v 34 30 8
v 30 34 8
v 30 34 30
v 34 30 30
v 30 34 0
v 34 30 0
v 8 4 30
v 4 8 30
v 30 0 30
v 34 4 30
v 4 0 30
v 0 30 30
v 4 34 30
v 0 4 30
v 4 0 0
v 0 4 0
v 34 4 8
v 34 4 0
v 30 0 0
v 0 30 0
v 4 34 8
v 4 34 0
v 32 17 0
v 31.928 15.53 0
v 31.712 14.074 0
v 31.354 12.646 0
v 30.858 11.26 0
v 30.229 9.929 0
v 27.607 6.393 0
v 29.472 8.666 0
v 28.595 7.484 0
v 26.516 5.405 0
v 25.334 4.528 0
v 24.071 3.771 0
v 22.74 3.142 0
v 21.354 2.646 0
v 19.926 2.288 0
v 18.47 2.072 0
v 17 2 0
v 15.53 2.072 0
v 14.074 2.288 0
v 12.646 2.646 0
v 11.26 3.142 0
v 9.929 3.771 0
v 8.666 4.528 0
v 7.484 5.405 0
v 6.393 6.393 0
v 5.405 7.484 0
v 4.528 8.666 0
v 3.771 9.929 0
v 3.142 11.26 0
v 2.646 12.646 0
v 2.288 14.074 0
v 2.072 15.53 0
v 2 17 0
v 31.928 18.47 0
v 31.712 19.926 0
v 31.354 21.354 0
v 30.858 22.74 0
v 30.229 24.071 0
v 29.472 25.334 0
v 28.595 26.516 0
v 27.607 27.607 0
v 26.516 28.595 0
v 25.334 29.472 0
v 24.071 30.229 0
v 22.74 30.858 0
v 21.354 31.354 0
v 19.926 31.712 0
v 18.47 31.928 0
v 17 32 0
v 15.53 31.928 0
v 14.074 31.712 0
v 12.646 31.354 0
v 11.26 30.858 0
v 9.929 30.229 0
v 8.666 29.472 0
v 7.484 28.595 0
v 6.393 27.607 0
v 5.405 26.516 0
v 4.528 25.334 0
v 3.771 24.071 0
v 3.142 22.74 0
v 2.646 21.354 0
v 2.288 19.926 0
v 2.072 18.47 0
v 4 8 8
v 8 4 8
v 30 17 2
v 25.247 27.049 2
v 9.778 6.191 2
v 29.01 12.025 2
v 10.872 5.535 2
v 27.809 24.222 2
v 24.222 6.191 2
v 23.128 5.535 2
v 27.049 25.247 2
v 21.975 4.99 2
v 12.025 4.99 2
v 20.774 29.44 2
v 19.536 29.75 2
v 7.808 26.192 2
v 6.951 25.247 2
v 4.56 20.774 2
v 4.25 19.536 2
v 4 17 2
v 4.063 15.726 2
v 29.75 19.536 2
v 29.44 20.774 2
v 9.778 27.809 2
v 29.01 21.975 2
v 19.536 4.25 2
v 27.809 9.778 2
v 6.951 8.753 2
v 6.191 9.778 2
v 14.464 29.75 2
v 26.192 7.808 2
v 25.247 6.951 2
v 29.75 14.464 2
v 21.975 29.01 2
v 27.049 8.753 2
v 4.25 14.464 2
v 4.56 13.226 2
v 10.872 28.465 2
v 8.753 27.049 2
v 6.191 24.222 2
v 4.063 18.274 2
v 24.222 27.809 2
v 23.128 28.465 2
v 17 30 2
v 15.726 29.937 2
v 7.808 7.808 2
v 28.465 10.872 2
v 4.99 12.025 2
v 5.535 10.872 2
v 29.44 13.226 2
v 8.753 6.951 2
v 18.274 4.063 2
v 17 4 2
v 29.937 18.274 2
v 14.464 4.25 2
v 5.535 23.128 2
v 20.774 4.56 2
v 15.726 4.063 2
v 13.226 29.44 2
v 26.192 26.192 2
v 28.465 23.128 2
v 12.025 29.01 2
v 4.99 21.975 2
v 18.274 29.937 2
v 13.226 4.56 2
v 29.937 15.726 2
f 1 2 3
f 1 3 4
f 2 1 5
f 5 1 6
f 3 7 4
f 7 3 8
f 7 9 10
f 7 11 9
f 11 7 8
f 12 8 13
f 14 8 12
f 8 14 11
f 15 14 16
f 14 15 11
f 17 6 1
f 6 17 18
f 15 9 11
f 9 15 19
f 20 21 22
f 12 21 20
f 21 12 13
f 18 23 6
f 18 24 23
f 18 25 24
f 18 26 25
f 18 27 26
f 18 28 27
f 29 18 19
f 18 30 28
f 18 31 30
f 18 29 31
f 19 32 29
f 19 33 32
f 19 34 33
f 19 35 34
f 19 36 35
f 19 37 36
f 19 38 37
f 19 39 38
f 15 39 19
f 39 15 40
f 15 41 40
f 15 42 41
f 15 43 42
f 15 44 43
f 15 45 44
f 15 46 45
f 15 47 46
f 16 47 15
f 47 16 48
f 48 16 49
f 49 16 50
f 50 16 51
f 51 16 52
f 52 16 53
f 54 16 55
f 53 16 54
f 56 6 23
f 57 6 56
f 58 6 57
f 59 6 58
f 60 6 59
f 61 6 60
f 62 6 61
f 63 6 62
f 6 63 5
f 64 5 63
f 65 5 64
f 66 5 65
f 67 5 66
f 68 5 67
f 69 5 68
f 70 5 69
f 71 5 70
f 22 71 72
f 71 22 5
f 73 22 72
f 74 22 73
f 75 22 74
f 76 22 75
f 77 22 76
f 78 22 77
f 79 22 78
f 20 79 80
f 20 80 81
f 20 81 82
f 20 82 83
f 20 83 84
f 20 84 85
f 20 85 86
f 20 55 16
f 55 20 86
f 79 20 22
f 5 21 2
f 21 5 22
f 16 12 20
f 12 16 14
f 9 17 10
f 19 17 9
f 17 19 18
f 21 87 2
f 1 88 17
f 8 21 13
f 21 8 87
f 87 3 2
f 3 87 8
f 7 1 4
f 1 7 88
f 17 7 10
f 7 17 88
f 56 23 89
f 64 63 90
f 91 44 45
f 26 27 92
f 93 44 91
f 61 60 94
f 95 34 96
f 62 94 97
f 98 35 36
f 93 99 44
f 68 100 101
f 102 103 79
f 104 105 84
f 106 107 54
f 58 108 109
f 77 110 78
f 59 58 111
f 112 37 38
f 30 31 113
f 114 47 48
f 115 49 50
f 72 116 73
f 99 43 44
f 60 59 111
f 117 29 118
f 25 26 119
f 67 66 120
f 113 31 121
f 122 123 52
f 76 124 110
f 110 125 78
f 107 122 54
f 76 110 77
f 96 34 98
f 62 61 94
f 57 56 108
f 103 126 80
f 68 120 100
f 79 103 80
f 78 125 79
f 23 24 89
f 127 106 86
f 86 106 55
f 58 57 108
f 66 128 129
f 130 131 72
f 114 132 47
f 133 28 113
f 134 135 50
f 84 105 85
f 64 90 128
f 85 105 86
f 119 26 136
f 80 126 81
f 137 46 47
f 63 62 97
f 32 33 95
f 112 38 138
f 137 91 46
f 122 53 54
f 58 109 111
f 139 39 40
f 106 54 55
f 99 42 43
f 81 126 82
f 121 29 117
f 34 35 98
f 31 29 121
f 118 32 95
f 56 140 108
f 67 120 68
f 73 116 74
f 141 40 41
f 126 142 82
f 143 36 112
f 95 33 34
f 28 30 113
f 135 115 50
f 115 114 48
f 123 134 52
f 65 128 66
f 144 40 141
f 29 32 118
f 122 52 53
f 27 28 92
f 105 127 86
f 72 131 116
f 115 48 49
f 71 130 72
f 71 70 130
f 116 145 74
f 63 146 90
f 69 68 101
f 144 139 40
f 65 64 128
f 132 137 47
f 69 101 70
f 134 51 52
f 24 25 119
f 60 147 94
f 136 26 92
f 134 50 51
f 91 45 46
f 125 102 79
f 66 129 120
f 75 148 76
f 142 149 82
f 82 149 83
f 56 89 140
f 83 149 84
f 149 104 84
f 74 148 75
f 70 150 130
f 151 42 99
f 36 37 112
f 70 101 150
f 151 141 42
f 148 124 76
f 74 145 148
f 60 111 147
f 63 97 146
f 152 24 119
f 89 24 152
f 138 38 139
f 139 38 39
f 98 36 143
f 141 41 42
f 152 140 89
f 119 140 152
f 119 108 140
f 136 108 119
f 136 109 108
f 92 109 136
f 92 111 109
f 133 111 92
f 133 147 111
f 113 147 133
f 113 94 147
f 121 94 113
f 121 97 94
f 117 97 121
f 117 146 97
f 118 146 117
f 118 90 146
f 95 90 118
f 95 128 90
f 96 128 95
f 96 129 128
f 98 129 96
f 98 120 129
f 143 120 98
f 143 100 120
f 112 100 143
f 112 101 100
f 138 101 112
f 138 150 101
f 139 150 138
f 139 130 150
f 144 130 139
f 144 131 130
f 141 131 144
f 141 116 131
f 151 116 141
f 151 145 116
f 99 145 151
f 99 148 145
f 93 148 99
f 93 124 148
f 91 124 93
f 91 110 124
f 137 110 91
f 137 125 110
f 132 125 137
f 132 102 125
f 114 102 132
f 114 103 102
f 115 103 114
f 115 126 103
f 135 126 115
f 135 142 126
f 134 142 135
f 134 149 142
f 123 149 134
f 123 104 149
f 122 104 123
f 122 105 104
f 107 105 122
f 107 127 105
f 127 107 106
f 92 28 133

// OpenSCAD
W = 34;
D = 34;
H = 30;
C = 4;

difference () {
    linear_extrude(H)
        polygon([[C, 0], [W - C, 0],
                [W, C], [W, D - C],
                [W - C, D], [C, D],
                [0, D - C], [0, C]]);
    translate([0, 0, C * 2]) {
        linear_extrude(H - C * 2) {
            polygon([[C, C * 2], [C, D], [W - C, D]]);
            polygon([[C * 2, C], [W, D - C], [W, C]]);
        }
    }
    translate([W / 2, D / 2, 0])
        cylinder(r1 = W / 2 - C / 2, r2 = W / 2 - C, h = C / 2, $fn = 64);
}
